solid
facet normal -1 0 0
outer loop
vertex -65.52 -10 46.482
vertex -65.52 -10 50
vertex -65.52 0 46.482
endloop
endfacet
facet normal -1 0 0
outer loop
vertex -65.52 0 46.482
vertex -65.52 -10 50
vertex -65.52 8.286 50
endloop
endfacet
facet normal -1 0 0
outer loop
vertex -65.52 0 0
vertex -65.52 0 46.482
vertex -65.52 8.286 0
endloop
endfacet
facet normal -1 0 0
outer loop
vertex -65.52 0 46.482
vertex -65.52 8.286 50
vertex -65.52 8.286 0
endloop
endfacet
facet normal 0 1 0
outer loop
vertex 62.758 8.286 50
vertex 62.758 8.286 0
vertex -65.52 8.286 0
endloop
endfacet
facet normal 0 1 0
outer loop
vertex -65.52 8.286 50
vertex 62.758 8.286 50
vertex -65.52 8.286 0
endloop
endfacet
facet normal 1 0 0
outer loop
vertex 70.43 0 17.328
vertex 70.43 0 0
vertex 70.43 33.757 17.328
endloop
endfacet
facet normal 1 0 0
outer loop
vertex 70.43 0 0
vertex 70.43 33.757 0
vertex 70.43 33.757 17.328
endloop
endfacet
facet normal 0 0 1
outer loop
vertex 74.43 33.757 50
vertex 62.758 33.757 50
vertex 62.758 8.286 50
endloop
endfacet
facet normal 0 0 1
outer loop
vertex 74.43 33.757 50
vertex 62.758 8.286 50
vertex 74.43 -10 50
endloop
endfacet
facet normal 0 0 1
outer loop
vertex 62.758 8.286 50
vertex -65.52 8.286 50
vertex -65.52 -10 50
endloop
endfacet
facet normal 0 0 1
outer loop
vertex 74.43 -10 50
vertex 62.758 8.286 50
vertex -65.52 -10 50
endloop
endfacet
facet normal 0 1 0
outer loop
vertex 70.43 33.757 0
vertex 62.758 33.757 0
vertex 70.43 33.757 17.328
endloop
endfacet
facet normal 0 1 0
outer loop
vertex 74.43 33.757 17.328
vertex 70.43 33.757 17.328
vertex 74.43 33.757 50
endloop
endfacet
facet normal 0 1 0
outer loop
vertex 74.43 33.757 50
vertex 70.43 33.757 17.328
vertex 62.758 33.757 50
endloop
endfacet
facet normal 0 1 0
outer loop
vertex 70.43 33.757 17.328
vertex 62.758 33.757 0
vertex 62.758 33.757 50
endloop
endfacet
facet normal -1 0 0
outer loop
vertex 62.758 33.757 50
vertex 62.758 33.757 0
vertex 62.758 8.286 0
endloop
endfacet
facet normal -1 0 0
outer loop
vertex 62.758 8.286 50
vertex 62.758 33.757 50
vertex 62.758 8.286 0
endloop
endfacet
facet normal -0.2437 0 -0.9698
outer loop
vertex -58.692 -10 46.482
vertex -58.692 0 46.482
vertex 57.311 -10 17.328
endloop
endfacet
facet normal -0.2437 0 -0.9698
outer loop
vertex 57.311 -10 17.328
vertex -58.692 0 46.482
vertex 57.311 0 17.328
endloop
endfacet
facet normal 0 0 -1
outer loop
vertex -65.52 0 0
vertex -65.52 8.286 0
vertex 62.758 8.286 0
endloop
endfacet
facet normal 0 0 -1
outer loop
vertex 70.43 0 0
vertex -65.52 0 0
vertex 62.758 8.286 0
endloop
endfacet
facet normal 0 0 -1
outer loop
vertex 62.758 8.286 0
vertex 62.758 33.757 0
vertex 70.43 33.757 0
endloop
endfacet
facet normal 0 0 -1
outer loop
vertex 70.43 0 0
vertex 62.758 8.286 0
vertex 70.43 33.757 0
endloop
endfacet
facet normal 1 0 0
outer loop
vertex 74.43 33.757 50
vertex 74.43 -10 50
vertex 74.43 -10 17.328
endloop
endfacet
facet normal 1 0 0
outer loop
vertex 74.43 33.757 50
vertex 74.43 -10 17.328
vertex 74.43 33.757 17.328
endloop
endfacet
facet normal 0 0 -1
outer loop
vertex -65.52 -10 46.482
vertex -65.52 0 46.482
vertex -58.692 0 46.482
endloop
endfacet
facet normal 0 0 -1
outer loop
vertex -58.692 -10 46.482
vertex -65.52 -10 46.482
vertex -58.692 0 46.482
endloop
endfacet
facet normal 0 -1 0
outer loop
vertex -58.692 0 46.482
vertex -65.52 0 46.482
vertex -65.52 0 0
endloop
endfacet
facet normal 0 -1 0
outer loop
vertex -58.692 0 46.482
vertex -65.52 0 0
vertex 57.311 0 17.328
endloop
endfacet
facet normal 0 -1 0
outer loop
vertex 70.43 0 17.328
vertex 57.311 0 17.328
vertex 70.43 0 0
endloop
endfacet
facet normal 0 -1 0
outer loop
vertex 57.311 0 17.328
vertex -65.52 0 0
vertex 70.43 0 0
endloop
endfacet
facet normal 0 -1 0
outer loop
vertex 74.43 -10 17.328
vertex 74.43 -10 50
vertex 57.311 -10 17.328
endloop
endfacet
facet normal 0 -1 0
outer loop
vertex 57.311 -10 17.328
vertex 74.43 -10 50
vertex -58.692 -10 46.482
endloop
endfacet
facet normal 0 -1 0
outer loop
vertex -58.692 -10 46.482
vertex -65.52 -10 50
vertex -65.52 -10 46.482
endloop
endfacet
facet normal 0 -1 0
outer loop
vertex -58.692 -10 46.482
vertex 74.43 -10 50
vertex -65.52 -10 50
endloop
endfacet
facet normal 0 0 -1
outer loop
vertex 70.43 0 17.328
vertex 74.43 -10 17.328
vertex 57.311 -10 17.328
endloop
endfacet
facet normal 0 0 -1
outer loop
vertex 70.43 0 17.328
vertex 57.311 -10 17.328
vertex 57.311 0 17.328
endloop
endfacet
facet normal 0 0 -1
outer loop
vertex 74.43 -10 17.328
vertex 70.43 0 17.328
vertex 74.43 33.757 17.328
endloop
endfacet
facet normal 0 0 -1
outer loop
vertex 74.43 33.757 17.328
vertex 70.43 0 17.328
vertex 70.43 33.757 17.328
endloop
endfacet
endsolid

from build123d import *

# Parameters (mm, degrees)
F1_DEPTH = 50
F3_DEPTH = 10
F5_DEPTH = 4


with BuildPart() as f1:
    # F0 (on Top) → F1 (new body)
    with BuildSketch(Plane.XY):
        Polygon((-65.519929, 8.285898), (-65.519929, 0), (70.430085, 0), (70.430085, 33.757344), (62.757969, 33.757344), (62.757969, 8.285898), align=None)
    extrude(amount=F1_DEPTH)

    # F2 (on face) → F3 (join)
    with BuildSketch(Plane.XZ):
        Polygon((-65.519929, 50), (-65.519929, 46.481945), (-58.691744, 46.481945), (57.310753, 17.327877), (70.430085, 17.327877), (70.430085, 50), align=None)
    extrude(amount=F3_DEPTH)

    # F4 (on face) → F5 (join)
    with BuildSketch(Plane.YZ.offset(70.430085)):
        Polygon((33.757344, 50), (-10, 50), (-10, 17.327877), (0, 17.327877), (33.757344, 17.327877), align=None)
    extrude(amount=F5_DEPTH)


solid = f1.part
